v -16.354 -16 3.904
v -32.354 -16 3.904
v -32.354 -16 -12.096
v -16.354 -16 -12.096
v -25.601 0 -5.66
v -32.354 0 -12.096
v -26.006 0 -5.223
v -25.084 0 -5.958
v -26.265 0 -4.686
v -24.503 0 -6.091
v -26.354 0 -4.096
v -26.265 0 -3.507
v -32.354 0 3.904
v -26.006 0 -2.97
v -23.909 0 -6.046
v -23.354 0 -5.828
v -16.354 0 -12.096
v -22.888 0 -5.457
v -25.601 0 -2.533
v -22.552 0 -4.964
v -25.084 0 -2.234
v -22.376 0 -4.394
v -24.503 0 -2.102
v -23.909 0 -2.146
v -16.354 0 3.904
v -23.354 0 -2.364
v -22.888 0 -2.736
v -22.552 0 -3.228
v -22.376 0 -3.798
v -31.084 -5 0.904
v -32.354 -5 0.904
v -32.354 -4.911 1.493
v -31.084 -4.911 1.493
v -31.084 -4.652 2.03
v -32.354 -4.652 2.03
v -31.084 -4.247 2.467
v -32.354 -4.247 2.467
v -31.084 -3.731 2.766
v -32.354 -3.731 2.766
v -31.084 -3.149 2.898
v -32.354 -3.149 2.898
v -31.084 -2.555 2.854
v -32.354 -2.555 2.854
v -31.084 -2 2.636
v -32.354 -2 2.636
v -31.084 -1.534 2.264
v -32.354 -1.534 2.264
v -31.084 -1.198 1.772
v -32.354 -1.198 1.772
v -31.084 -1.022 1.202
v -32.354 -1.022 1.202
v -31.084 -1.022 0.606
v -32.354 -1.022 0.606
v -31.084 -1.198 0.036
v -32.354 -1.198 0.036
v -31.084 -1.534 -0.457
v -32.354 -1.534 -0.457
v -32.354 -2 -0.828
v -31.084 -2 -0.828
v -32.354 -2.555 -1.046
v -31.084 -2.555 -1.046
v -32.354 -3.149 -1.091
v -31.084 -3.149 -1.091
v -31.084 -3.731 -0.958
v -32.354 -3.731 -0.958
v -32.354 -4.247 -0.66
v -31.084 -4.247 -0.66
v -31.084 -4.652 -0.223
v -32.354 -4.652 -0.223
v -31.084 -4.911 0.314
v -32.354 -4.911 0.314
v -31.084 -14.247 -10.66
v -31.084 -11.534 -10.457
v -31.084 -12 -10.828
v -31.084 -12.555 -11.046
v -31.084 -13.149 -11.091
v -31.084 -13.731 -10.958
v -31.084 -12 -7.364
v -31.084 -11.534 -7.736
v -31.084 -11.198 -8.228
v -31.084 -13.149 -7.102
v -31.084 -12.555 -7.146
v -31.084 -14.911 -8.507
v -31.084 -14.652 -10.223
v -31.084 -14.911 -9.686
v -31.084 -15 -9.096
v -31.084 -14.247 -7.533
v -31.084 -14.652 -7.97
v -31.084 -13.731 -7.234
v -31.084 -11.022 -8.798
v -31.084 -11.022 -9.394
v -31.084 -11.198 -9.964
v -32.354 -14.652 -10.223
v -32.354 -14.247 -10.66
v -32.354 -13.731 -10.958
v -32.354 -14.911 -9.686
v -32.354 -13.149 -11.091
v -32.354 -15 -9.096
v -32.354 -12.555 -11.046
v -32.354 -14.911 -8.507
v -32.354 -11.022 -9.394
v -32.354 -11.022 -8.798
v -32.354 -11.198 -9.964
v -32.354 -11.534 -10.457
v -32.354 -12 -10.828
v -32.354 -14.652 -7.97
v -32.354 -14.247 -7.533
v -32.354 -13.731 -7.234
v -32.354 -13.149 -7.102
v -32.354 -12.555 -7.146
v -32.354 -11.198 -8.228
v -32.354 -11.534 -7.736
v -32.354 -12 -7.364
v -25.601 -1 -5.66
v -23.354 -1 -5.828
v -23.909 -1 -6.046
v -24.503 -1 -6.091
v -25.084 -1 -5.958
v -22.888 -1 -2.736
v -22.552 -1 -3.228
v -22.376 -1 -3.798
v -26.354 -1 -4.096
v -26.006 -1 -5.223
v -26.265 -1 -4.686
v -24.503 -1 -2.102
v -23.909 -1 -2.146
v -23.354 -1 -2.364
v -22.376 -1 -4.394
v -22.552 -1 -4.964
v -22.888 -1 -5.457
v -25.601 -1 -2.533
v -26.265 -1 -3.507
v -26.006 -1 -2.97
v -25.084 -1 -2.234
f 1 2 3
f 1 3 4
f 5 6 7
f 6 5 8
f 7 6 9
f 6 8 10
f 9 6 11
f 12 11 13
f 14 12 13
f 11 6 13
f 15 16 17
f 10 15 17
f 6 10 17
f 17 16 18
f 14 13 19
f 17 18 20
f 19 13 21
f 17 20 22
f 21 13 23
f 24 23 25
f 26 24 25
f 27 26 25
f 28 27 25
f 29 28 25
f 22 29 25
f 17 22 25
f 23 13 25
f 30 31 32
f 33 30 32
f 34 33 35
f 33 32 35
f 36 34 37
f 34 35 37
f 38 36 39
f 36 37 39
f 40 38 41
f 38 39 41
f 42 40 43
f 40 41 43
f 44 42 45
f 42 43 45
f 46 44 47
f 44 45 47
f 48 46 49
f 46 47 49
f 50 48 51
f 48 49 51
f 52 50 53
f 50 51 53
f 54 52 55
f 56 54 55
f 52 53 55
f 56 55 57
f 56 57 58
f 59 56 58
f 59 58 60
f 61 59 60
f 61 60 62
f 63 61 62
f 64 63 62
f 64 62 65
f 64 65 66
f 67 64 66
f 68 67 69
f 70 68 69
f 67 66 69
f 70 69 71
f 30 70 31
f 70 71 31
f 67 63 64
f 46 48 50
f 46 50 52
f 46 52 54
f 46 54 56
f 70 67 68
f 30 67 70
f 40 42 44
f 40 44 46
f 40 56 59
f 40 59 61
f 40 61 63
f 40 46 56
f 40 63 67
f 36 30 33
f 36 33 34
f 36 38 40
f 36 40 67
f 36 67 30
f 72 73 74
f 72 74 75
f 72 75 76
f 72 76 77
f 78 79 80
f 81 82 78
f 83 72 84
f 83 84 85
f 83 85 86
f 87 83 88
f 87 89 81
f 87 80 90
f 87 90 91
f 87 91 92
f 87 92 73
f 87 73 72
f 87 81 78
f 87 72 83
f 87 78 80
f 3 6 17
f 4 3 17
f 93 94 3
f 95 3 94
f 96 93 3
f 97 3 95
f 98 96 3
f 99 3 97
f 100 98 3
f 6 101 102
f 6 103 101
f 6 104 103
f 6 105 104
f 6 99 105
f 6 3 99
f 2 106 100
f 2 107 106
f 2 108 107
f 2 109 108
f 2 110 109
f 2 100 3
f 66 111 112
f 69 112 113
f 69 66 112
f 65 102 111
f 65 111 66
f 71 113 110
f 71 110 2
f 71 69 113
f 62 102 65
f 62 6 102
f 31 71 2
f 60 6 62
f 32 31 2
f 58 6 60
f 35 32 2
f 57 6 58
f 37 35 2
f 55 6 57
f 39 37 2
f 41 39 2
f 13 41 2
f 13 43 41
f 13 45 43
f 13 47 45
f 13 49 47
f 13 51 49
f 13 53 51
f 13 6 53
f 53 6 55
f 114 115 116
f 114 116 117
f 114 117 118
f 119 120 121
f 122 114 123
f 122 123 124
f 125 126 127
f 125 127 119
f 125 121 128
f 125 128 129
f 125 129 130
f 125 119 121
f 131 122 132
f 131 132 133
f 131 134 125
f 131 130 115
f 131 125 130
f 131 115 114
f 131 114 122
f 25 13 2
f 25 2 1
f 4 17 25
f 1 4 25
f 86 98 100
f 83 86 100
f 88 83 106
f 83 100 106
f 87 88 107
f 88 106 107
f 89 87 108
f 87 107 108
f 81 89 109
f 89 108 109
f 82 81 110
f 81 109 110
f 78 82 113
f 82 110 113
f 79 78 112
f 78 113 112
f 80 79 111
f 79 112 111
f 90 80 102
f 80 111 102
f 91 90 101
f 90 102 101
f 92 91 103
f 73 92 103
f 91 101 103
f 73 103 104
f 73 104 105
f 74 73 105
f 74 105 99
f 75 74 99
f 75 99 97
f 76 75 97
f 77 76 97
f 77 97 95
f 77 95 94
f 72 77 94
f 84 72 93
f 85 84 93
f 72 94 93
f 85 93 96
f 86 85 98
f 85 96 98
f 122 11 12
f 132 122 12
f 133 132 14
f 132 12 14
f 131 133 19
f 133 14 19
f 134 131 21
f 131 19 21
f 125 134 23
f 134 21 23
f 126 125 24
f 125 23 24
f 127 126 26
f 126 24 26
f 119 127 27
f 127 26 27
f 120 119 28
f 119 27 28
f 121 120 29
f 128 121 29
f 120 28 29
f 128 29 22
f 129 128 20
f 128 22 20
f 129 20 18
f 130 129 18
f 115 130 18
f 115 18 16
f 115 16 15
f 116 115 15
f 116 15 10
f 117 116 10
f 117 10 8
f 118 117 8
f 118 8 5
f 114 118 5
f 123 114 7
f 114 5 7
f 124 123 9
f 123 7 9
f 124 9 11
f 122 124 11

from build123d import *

# Parameters (mm, degrees)
F0_W     = 16
F0_H     = 16
F1_DEPTH = 16
F2_R     = 2
F3_DEPTH = 1
F4_R     = 2
F6_DEPTH = 1.27


with BuildPart() as f1:
    # F0 (on Front) → F1 (new body)
    with BuildSketch(Plane.XZ):
        with Locations((-24.35377, -4.09623)):
            Rectangle(F0_W, F0_H)
    extrude(amount=F1_DEPTH)

    # F2 (on face) → F3 (cut)
    with BuildSketch(Plane(origin=(0, 0, 0), x_dir=(-1, 0, 0), z_dir=(0, 1, 0))):
        with Locations((24.35377, -4.09623)):
            Circle(F2_R)
    extrude(amount=-F3_DEPTH, mode=Mode.SUBTRACT)

    # F4 (on face) → F6 (cut)
    with BuildSketch(Plane(origin=(-32.35377, 0, 0), x_dir=(0, -1, 0), z_dir=(-1, 0, 0))):
        with Locations((13, -9.09623)):
            Circle(F4_R)
        with Locations((3, 0.90377)):
            Circle(F4_R)
    extrude(amount=-F6_DEPTH, mode=Mode.SUBTRACT)


solid = f1.part
